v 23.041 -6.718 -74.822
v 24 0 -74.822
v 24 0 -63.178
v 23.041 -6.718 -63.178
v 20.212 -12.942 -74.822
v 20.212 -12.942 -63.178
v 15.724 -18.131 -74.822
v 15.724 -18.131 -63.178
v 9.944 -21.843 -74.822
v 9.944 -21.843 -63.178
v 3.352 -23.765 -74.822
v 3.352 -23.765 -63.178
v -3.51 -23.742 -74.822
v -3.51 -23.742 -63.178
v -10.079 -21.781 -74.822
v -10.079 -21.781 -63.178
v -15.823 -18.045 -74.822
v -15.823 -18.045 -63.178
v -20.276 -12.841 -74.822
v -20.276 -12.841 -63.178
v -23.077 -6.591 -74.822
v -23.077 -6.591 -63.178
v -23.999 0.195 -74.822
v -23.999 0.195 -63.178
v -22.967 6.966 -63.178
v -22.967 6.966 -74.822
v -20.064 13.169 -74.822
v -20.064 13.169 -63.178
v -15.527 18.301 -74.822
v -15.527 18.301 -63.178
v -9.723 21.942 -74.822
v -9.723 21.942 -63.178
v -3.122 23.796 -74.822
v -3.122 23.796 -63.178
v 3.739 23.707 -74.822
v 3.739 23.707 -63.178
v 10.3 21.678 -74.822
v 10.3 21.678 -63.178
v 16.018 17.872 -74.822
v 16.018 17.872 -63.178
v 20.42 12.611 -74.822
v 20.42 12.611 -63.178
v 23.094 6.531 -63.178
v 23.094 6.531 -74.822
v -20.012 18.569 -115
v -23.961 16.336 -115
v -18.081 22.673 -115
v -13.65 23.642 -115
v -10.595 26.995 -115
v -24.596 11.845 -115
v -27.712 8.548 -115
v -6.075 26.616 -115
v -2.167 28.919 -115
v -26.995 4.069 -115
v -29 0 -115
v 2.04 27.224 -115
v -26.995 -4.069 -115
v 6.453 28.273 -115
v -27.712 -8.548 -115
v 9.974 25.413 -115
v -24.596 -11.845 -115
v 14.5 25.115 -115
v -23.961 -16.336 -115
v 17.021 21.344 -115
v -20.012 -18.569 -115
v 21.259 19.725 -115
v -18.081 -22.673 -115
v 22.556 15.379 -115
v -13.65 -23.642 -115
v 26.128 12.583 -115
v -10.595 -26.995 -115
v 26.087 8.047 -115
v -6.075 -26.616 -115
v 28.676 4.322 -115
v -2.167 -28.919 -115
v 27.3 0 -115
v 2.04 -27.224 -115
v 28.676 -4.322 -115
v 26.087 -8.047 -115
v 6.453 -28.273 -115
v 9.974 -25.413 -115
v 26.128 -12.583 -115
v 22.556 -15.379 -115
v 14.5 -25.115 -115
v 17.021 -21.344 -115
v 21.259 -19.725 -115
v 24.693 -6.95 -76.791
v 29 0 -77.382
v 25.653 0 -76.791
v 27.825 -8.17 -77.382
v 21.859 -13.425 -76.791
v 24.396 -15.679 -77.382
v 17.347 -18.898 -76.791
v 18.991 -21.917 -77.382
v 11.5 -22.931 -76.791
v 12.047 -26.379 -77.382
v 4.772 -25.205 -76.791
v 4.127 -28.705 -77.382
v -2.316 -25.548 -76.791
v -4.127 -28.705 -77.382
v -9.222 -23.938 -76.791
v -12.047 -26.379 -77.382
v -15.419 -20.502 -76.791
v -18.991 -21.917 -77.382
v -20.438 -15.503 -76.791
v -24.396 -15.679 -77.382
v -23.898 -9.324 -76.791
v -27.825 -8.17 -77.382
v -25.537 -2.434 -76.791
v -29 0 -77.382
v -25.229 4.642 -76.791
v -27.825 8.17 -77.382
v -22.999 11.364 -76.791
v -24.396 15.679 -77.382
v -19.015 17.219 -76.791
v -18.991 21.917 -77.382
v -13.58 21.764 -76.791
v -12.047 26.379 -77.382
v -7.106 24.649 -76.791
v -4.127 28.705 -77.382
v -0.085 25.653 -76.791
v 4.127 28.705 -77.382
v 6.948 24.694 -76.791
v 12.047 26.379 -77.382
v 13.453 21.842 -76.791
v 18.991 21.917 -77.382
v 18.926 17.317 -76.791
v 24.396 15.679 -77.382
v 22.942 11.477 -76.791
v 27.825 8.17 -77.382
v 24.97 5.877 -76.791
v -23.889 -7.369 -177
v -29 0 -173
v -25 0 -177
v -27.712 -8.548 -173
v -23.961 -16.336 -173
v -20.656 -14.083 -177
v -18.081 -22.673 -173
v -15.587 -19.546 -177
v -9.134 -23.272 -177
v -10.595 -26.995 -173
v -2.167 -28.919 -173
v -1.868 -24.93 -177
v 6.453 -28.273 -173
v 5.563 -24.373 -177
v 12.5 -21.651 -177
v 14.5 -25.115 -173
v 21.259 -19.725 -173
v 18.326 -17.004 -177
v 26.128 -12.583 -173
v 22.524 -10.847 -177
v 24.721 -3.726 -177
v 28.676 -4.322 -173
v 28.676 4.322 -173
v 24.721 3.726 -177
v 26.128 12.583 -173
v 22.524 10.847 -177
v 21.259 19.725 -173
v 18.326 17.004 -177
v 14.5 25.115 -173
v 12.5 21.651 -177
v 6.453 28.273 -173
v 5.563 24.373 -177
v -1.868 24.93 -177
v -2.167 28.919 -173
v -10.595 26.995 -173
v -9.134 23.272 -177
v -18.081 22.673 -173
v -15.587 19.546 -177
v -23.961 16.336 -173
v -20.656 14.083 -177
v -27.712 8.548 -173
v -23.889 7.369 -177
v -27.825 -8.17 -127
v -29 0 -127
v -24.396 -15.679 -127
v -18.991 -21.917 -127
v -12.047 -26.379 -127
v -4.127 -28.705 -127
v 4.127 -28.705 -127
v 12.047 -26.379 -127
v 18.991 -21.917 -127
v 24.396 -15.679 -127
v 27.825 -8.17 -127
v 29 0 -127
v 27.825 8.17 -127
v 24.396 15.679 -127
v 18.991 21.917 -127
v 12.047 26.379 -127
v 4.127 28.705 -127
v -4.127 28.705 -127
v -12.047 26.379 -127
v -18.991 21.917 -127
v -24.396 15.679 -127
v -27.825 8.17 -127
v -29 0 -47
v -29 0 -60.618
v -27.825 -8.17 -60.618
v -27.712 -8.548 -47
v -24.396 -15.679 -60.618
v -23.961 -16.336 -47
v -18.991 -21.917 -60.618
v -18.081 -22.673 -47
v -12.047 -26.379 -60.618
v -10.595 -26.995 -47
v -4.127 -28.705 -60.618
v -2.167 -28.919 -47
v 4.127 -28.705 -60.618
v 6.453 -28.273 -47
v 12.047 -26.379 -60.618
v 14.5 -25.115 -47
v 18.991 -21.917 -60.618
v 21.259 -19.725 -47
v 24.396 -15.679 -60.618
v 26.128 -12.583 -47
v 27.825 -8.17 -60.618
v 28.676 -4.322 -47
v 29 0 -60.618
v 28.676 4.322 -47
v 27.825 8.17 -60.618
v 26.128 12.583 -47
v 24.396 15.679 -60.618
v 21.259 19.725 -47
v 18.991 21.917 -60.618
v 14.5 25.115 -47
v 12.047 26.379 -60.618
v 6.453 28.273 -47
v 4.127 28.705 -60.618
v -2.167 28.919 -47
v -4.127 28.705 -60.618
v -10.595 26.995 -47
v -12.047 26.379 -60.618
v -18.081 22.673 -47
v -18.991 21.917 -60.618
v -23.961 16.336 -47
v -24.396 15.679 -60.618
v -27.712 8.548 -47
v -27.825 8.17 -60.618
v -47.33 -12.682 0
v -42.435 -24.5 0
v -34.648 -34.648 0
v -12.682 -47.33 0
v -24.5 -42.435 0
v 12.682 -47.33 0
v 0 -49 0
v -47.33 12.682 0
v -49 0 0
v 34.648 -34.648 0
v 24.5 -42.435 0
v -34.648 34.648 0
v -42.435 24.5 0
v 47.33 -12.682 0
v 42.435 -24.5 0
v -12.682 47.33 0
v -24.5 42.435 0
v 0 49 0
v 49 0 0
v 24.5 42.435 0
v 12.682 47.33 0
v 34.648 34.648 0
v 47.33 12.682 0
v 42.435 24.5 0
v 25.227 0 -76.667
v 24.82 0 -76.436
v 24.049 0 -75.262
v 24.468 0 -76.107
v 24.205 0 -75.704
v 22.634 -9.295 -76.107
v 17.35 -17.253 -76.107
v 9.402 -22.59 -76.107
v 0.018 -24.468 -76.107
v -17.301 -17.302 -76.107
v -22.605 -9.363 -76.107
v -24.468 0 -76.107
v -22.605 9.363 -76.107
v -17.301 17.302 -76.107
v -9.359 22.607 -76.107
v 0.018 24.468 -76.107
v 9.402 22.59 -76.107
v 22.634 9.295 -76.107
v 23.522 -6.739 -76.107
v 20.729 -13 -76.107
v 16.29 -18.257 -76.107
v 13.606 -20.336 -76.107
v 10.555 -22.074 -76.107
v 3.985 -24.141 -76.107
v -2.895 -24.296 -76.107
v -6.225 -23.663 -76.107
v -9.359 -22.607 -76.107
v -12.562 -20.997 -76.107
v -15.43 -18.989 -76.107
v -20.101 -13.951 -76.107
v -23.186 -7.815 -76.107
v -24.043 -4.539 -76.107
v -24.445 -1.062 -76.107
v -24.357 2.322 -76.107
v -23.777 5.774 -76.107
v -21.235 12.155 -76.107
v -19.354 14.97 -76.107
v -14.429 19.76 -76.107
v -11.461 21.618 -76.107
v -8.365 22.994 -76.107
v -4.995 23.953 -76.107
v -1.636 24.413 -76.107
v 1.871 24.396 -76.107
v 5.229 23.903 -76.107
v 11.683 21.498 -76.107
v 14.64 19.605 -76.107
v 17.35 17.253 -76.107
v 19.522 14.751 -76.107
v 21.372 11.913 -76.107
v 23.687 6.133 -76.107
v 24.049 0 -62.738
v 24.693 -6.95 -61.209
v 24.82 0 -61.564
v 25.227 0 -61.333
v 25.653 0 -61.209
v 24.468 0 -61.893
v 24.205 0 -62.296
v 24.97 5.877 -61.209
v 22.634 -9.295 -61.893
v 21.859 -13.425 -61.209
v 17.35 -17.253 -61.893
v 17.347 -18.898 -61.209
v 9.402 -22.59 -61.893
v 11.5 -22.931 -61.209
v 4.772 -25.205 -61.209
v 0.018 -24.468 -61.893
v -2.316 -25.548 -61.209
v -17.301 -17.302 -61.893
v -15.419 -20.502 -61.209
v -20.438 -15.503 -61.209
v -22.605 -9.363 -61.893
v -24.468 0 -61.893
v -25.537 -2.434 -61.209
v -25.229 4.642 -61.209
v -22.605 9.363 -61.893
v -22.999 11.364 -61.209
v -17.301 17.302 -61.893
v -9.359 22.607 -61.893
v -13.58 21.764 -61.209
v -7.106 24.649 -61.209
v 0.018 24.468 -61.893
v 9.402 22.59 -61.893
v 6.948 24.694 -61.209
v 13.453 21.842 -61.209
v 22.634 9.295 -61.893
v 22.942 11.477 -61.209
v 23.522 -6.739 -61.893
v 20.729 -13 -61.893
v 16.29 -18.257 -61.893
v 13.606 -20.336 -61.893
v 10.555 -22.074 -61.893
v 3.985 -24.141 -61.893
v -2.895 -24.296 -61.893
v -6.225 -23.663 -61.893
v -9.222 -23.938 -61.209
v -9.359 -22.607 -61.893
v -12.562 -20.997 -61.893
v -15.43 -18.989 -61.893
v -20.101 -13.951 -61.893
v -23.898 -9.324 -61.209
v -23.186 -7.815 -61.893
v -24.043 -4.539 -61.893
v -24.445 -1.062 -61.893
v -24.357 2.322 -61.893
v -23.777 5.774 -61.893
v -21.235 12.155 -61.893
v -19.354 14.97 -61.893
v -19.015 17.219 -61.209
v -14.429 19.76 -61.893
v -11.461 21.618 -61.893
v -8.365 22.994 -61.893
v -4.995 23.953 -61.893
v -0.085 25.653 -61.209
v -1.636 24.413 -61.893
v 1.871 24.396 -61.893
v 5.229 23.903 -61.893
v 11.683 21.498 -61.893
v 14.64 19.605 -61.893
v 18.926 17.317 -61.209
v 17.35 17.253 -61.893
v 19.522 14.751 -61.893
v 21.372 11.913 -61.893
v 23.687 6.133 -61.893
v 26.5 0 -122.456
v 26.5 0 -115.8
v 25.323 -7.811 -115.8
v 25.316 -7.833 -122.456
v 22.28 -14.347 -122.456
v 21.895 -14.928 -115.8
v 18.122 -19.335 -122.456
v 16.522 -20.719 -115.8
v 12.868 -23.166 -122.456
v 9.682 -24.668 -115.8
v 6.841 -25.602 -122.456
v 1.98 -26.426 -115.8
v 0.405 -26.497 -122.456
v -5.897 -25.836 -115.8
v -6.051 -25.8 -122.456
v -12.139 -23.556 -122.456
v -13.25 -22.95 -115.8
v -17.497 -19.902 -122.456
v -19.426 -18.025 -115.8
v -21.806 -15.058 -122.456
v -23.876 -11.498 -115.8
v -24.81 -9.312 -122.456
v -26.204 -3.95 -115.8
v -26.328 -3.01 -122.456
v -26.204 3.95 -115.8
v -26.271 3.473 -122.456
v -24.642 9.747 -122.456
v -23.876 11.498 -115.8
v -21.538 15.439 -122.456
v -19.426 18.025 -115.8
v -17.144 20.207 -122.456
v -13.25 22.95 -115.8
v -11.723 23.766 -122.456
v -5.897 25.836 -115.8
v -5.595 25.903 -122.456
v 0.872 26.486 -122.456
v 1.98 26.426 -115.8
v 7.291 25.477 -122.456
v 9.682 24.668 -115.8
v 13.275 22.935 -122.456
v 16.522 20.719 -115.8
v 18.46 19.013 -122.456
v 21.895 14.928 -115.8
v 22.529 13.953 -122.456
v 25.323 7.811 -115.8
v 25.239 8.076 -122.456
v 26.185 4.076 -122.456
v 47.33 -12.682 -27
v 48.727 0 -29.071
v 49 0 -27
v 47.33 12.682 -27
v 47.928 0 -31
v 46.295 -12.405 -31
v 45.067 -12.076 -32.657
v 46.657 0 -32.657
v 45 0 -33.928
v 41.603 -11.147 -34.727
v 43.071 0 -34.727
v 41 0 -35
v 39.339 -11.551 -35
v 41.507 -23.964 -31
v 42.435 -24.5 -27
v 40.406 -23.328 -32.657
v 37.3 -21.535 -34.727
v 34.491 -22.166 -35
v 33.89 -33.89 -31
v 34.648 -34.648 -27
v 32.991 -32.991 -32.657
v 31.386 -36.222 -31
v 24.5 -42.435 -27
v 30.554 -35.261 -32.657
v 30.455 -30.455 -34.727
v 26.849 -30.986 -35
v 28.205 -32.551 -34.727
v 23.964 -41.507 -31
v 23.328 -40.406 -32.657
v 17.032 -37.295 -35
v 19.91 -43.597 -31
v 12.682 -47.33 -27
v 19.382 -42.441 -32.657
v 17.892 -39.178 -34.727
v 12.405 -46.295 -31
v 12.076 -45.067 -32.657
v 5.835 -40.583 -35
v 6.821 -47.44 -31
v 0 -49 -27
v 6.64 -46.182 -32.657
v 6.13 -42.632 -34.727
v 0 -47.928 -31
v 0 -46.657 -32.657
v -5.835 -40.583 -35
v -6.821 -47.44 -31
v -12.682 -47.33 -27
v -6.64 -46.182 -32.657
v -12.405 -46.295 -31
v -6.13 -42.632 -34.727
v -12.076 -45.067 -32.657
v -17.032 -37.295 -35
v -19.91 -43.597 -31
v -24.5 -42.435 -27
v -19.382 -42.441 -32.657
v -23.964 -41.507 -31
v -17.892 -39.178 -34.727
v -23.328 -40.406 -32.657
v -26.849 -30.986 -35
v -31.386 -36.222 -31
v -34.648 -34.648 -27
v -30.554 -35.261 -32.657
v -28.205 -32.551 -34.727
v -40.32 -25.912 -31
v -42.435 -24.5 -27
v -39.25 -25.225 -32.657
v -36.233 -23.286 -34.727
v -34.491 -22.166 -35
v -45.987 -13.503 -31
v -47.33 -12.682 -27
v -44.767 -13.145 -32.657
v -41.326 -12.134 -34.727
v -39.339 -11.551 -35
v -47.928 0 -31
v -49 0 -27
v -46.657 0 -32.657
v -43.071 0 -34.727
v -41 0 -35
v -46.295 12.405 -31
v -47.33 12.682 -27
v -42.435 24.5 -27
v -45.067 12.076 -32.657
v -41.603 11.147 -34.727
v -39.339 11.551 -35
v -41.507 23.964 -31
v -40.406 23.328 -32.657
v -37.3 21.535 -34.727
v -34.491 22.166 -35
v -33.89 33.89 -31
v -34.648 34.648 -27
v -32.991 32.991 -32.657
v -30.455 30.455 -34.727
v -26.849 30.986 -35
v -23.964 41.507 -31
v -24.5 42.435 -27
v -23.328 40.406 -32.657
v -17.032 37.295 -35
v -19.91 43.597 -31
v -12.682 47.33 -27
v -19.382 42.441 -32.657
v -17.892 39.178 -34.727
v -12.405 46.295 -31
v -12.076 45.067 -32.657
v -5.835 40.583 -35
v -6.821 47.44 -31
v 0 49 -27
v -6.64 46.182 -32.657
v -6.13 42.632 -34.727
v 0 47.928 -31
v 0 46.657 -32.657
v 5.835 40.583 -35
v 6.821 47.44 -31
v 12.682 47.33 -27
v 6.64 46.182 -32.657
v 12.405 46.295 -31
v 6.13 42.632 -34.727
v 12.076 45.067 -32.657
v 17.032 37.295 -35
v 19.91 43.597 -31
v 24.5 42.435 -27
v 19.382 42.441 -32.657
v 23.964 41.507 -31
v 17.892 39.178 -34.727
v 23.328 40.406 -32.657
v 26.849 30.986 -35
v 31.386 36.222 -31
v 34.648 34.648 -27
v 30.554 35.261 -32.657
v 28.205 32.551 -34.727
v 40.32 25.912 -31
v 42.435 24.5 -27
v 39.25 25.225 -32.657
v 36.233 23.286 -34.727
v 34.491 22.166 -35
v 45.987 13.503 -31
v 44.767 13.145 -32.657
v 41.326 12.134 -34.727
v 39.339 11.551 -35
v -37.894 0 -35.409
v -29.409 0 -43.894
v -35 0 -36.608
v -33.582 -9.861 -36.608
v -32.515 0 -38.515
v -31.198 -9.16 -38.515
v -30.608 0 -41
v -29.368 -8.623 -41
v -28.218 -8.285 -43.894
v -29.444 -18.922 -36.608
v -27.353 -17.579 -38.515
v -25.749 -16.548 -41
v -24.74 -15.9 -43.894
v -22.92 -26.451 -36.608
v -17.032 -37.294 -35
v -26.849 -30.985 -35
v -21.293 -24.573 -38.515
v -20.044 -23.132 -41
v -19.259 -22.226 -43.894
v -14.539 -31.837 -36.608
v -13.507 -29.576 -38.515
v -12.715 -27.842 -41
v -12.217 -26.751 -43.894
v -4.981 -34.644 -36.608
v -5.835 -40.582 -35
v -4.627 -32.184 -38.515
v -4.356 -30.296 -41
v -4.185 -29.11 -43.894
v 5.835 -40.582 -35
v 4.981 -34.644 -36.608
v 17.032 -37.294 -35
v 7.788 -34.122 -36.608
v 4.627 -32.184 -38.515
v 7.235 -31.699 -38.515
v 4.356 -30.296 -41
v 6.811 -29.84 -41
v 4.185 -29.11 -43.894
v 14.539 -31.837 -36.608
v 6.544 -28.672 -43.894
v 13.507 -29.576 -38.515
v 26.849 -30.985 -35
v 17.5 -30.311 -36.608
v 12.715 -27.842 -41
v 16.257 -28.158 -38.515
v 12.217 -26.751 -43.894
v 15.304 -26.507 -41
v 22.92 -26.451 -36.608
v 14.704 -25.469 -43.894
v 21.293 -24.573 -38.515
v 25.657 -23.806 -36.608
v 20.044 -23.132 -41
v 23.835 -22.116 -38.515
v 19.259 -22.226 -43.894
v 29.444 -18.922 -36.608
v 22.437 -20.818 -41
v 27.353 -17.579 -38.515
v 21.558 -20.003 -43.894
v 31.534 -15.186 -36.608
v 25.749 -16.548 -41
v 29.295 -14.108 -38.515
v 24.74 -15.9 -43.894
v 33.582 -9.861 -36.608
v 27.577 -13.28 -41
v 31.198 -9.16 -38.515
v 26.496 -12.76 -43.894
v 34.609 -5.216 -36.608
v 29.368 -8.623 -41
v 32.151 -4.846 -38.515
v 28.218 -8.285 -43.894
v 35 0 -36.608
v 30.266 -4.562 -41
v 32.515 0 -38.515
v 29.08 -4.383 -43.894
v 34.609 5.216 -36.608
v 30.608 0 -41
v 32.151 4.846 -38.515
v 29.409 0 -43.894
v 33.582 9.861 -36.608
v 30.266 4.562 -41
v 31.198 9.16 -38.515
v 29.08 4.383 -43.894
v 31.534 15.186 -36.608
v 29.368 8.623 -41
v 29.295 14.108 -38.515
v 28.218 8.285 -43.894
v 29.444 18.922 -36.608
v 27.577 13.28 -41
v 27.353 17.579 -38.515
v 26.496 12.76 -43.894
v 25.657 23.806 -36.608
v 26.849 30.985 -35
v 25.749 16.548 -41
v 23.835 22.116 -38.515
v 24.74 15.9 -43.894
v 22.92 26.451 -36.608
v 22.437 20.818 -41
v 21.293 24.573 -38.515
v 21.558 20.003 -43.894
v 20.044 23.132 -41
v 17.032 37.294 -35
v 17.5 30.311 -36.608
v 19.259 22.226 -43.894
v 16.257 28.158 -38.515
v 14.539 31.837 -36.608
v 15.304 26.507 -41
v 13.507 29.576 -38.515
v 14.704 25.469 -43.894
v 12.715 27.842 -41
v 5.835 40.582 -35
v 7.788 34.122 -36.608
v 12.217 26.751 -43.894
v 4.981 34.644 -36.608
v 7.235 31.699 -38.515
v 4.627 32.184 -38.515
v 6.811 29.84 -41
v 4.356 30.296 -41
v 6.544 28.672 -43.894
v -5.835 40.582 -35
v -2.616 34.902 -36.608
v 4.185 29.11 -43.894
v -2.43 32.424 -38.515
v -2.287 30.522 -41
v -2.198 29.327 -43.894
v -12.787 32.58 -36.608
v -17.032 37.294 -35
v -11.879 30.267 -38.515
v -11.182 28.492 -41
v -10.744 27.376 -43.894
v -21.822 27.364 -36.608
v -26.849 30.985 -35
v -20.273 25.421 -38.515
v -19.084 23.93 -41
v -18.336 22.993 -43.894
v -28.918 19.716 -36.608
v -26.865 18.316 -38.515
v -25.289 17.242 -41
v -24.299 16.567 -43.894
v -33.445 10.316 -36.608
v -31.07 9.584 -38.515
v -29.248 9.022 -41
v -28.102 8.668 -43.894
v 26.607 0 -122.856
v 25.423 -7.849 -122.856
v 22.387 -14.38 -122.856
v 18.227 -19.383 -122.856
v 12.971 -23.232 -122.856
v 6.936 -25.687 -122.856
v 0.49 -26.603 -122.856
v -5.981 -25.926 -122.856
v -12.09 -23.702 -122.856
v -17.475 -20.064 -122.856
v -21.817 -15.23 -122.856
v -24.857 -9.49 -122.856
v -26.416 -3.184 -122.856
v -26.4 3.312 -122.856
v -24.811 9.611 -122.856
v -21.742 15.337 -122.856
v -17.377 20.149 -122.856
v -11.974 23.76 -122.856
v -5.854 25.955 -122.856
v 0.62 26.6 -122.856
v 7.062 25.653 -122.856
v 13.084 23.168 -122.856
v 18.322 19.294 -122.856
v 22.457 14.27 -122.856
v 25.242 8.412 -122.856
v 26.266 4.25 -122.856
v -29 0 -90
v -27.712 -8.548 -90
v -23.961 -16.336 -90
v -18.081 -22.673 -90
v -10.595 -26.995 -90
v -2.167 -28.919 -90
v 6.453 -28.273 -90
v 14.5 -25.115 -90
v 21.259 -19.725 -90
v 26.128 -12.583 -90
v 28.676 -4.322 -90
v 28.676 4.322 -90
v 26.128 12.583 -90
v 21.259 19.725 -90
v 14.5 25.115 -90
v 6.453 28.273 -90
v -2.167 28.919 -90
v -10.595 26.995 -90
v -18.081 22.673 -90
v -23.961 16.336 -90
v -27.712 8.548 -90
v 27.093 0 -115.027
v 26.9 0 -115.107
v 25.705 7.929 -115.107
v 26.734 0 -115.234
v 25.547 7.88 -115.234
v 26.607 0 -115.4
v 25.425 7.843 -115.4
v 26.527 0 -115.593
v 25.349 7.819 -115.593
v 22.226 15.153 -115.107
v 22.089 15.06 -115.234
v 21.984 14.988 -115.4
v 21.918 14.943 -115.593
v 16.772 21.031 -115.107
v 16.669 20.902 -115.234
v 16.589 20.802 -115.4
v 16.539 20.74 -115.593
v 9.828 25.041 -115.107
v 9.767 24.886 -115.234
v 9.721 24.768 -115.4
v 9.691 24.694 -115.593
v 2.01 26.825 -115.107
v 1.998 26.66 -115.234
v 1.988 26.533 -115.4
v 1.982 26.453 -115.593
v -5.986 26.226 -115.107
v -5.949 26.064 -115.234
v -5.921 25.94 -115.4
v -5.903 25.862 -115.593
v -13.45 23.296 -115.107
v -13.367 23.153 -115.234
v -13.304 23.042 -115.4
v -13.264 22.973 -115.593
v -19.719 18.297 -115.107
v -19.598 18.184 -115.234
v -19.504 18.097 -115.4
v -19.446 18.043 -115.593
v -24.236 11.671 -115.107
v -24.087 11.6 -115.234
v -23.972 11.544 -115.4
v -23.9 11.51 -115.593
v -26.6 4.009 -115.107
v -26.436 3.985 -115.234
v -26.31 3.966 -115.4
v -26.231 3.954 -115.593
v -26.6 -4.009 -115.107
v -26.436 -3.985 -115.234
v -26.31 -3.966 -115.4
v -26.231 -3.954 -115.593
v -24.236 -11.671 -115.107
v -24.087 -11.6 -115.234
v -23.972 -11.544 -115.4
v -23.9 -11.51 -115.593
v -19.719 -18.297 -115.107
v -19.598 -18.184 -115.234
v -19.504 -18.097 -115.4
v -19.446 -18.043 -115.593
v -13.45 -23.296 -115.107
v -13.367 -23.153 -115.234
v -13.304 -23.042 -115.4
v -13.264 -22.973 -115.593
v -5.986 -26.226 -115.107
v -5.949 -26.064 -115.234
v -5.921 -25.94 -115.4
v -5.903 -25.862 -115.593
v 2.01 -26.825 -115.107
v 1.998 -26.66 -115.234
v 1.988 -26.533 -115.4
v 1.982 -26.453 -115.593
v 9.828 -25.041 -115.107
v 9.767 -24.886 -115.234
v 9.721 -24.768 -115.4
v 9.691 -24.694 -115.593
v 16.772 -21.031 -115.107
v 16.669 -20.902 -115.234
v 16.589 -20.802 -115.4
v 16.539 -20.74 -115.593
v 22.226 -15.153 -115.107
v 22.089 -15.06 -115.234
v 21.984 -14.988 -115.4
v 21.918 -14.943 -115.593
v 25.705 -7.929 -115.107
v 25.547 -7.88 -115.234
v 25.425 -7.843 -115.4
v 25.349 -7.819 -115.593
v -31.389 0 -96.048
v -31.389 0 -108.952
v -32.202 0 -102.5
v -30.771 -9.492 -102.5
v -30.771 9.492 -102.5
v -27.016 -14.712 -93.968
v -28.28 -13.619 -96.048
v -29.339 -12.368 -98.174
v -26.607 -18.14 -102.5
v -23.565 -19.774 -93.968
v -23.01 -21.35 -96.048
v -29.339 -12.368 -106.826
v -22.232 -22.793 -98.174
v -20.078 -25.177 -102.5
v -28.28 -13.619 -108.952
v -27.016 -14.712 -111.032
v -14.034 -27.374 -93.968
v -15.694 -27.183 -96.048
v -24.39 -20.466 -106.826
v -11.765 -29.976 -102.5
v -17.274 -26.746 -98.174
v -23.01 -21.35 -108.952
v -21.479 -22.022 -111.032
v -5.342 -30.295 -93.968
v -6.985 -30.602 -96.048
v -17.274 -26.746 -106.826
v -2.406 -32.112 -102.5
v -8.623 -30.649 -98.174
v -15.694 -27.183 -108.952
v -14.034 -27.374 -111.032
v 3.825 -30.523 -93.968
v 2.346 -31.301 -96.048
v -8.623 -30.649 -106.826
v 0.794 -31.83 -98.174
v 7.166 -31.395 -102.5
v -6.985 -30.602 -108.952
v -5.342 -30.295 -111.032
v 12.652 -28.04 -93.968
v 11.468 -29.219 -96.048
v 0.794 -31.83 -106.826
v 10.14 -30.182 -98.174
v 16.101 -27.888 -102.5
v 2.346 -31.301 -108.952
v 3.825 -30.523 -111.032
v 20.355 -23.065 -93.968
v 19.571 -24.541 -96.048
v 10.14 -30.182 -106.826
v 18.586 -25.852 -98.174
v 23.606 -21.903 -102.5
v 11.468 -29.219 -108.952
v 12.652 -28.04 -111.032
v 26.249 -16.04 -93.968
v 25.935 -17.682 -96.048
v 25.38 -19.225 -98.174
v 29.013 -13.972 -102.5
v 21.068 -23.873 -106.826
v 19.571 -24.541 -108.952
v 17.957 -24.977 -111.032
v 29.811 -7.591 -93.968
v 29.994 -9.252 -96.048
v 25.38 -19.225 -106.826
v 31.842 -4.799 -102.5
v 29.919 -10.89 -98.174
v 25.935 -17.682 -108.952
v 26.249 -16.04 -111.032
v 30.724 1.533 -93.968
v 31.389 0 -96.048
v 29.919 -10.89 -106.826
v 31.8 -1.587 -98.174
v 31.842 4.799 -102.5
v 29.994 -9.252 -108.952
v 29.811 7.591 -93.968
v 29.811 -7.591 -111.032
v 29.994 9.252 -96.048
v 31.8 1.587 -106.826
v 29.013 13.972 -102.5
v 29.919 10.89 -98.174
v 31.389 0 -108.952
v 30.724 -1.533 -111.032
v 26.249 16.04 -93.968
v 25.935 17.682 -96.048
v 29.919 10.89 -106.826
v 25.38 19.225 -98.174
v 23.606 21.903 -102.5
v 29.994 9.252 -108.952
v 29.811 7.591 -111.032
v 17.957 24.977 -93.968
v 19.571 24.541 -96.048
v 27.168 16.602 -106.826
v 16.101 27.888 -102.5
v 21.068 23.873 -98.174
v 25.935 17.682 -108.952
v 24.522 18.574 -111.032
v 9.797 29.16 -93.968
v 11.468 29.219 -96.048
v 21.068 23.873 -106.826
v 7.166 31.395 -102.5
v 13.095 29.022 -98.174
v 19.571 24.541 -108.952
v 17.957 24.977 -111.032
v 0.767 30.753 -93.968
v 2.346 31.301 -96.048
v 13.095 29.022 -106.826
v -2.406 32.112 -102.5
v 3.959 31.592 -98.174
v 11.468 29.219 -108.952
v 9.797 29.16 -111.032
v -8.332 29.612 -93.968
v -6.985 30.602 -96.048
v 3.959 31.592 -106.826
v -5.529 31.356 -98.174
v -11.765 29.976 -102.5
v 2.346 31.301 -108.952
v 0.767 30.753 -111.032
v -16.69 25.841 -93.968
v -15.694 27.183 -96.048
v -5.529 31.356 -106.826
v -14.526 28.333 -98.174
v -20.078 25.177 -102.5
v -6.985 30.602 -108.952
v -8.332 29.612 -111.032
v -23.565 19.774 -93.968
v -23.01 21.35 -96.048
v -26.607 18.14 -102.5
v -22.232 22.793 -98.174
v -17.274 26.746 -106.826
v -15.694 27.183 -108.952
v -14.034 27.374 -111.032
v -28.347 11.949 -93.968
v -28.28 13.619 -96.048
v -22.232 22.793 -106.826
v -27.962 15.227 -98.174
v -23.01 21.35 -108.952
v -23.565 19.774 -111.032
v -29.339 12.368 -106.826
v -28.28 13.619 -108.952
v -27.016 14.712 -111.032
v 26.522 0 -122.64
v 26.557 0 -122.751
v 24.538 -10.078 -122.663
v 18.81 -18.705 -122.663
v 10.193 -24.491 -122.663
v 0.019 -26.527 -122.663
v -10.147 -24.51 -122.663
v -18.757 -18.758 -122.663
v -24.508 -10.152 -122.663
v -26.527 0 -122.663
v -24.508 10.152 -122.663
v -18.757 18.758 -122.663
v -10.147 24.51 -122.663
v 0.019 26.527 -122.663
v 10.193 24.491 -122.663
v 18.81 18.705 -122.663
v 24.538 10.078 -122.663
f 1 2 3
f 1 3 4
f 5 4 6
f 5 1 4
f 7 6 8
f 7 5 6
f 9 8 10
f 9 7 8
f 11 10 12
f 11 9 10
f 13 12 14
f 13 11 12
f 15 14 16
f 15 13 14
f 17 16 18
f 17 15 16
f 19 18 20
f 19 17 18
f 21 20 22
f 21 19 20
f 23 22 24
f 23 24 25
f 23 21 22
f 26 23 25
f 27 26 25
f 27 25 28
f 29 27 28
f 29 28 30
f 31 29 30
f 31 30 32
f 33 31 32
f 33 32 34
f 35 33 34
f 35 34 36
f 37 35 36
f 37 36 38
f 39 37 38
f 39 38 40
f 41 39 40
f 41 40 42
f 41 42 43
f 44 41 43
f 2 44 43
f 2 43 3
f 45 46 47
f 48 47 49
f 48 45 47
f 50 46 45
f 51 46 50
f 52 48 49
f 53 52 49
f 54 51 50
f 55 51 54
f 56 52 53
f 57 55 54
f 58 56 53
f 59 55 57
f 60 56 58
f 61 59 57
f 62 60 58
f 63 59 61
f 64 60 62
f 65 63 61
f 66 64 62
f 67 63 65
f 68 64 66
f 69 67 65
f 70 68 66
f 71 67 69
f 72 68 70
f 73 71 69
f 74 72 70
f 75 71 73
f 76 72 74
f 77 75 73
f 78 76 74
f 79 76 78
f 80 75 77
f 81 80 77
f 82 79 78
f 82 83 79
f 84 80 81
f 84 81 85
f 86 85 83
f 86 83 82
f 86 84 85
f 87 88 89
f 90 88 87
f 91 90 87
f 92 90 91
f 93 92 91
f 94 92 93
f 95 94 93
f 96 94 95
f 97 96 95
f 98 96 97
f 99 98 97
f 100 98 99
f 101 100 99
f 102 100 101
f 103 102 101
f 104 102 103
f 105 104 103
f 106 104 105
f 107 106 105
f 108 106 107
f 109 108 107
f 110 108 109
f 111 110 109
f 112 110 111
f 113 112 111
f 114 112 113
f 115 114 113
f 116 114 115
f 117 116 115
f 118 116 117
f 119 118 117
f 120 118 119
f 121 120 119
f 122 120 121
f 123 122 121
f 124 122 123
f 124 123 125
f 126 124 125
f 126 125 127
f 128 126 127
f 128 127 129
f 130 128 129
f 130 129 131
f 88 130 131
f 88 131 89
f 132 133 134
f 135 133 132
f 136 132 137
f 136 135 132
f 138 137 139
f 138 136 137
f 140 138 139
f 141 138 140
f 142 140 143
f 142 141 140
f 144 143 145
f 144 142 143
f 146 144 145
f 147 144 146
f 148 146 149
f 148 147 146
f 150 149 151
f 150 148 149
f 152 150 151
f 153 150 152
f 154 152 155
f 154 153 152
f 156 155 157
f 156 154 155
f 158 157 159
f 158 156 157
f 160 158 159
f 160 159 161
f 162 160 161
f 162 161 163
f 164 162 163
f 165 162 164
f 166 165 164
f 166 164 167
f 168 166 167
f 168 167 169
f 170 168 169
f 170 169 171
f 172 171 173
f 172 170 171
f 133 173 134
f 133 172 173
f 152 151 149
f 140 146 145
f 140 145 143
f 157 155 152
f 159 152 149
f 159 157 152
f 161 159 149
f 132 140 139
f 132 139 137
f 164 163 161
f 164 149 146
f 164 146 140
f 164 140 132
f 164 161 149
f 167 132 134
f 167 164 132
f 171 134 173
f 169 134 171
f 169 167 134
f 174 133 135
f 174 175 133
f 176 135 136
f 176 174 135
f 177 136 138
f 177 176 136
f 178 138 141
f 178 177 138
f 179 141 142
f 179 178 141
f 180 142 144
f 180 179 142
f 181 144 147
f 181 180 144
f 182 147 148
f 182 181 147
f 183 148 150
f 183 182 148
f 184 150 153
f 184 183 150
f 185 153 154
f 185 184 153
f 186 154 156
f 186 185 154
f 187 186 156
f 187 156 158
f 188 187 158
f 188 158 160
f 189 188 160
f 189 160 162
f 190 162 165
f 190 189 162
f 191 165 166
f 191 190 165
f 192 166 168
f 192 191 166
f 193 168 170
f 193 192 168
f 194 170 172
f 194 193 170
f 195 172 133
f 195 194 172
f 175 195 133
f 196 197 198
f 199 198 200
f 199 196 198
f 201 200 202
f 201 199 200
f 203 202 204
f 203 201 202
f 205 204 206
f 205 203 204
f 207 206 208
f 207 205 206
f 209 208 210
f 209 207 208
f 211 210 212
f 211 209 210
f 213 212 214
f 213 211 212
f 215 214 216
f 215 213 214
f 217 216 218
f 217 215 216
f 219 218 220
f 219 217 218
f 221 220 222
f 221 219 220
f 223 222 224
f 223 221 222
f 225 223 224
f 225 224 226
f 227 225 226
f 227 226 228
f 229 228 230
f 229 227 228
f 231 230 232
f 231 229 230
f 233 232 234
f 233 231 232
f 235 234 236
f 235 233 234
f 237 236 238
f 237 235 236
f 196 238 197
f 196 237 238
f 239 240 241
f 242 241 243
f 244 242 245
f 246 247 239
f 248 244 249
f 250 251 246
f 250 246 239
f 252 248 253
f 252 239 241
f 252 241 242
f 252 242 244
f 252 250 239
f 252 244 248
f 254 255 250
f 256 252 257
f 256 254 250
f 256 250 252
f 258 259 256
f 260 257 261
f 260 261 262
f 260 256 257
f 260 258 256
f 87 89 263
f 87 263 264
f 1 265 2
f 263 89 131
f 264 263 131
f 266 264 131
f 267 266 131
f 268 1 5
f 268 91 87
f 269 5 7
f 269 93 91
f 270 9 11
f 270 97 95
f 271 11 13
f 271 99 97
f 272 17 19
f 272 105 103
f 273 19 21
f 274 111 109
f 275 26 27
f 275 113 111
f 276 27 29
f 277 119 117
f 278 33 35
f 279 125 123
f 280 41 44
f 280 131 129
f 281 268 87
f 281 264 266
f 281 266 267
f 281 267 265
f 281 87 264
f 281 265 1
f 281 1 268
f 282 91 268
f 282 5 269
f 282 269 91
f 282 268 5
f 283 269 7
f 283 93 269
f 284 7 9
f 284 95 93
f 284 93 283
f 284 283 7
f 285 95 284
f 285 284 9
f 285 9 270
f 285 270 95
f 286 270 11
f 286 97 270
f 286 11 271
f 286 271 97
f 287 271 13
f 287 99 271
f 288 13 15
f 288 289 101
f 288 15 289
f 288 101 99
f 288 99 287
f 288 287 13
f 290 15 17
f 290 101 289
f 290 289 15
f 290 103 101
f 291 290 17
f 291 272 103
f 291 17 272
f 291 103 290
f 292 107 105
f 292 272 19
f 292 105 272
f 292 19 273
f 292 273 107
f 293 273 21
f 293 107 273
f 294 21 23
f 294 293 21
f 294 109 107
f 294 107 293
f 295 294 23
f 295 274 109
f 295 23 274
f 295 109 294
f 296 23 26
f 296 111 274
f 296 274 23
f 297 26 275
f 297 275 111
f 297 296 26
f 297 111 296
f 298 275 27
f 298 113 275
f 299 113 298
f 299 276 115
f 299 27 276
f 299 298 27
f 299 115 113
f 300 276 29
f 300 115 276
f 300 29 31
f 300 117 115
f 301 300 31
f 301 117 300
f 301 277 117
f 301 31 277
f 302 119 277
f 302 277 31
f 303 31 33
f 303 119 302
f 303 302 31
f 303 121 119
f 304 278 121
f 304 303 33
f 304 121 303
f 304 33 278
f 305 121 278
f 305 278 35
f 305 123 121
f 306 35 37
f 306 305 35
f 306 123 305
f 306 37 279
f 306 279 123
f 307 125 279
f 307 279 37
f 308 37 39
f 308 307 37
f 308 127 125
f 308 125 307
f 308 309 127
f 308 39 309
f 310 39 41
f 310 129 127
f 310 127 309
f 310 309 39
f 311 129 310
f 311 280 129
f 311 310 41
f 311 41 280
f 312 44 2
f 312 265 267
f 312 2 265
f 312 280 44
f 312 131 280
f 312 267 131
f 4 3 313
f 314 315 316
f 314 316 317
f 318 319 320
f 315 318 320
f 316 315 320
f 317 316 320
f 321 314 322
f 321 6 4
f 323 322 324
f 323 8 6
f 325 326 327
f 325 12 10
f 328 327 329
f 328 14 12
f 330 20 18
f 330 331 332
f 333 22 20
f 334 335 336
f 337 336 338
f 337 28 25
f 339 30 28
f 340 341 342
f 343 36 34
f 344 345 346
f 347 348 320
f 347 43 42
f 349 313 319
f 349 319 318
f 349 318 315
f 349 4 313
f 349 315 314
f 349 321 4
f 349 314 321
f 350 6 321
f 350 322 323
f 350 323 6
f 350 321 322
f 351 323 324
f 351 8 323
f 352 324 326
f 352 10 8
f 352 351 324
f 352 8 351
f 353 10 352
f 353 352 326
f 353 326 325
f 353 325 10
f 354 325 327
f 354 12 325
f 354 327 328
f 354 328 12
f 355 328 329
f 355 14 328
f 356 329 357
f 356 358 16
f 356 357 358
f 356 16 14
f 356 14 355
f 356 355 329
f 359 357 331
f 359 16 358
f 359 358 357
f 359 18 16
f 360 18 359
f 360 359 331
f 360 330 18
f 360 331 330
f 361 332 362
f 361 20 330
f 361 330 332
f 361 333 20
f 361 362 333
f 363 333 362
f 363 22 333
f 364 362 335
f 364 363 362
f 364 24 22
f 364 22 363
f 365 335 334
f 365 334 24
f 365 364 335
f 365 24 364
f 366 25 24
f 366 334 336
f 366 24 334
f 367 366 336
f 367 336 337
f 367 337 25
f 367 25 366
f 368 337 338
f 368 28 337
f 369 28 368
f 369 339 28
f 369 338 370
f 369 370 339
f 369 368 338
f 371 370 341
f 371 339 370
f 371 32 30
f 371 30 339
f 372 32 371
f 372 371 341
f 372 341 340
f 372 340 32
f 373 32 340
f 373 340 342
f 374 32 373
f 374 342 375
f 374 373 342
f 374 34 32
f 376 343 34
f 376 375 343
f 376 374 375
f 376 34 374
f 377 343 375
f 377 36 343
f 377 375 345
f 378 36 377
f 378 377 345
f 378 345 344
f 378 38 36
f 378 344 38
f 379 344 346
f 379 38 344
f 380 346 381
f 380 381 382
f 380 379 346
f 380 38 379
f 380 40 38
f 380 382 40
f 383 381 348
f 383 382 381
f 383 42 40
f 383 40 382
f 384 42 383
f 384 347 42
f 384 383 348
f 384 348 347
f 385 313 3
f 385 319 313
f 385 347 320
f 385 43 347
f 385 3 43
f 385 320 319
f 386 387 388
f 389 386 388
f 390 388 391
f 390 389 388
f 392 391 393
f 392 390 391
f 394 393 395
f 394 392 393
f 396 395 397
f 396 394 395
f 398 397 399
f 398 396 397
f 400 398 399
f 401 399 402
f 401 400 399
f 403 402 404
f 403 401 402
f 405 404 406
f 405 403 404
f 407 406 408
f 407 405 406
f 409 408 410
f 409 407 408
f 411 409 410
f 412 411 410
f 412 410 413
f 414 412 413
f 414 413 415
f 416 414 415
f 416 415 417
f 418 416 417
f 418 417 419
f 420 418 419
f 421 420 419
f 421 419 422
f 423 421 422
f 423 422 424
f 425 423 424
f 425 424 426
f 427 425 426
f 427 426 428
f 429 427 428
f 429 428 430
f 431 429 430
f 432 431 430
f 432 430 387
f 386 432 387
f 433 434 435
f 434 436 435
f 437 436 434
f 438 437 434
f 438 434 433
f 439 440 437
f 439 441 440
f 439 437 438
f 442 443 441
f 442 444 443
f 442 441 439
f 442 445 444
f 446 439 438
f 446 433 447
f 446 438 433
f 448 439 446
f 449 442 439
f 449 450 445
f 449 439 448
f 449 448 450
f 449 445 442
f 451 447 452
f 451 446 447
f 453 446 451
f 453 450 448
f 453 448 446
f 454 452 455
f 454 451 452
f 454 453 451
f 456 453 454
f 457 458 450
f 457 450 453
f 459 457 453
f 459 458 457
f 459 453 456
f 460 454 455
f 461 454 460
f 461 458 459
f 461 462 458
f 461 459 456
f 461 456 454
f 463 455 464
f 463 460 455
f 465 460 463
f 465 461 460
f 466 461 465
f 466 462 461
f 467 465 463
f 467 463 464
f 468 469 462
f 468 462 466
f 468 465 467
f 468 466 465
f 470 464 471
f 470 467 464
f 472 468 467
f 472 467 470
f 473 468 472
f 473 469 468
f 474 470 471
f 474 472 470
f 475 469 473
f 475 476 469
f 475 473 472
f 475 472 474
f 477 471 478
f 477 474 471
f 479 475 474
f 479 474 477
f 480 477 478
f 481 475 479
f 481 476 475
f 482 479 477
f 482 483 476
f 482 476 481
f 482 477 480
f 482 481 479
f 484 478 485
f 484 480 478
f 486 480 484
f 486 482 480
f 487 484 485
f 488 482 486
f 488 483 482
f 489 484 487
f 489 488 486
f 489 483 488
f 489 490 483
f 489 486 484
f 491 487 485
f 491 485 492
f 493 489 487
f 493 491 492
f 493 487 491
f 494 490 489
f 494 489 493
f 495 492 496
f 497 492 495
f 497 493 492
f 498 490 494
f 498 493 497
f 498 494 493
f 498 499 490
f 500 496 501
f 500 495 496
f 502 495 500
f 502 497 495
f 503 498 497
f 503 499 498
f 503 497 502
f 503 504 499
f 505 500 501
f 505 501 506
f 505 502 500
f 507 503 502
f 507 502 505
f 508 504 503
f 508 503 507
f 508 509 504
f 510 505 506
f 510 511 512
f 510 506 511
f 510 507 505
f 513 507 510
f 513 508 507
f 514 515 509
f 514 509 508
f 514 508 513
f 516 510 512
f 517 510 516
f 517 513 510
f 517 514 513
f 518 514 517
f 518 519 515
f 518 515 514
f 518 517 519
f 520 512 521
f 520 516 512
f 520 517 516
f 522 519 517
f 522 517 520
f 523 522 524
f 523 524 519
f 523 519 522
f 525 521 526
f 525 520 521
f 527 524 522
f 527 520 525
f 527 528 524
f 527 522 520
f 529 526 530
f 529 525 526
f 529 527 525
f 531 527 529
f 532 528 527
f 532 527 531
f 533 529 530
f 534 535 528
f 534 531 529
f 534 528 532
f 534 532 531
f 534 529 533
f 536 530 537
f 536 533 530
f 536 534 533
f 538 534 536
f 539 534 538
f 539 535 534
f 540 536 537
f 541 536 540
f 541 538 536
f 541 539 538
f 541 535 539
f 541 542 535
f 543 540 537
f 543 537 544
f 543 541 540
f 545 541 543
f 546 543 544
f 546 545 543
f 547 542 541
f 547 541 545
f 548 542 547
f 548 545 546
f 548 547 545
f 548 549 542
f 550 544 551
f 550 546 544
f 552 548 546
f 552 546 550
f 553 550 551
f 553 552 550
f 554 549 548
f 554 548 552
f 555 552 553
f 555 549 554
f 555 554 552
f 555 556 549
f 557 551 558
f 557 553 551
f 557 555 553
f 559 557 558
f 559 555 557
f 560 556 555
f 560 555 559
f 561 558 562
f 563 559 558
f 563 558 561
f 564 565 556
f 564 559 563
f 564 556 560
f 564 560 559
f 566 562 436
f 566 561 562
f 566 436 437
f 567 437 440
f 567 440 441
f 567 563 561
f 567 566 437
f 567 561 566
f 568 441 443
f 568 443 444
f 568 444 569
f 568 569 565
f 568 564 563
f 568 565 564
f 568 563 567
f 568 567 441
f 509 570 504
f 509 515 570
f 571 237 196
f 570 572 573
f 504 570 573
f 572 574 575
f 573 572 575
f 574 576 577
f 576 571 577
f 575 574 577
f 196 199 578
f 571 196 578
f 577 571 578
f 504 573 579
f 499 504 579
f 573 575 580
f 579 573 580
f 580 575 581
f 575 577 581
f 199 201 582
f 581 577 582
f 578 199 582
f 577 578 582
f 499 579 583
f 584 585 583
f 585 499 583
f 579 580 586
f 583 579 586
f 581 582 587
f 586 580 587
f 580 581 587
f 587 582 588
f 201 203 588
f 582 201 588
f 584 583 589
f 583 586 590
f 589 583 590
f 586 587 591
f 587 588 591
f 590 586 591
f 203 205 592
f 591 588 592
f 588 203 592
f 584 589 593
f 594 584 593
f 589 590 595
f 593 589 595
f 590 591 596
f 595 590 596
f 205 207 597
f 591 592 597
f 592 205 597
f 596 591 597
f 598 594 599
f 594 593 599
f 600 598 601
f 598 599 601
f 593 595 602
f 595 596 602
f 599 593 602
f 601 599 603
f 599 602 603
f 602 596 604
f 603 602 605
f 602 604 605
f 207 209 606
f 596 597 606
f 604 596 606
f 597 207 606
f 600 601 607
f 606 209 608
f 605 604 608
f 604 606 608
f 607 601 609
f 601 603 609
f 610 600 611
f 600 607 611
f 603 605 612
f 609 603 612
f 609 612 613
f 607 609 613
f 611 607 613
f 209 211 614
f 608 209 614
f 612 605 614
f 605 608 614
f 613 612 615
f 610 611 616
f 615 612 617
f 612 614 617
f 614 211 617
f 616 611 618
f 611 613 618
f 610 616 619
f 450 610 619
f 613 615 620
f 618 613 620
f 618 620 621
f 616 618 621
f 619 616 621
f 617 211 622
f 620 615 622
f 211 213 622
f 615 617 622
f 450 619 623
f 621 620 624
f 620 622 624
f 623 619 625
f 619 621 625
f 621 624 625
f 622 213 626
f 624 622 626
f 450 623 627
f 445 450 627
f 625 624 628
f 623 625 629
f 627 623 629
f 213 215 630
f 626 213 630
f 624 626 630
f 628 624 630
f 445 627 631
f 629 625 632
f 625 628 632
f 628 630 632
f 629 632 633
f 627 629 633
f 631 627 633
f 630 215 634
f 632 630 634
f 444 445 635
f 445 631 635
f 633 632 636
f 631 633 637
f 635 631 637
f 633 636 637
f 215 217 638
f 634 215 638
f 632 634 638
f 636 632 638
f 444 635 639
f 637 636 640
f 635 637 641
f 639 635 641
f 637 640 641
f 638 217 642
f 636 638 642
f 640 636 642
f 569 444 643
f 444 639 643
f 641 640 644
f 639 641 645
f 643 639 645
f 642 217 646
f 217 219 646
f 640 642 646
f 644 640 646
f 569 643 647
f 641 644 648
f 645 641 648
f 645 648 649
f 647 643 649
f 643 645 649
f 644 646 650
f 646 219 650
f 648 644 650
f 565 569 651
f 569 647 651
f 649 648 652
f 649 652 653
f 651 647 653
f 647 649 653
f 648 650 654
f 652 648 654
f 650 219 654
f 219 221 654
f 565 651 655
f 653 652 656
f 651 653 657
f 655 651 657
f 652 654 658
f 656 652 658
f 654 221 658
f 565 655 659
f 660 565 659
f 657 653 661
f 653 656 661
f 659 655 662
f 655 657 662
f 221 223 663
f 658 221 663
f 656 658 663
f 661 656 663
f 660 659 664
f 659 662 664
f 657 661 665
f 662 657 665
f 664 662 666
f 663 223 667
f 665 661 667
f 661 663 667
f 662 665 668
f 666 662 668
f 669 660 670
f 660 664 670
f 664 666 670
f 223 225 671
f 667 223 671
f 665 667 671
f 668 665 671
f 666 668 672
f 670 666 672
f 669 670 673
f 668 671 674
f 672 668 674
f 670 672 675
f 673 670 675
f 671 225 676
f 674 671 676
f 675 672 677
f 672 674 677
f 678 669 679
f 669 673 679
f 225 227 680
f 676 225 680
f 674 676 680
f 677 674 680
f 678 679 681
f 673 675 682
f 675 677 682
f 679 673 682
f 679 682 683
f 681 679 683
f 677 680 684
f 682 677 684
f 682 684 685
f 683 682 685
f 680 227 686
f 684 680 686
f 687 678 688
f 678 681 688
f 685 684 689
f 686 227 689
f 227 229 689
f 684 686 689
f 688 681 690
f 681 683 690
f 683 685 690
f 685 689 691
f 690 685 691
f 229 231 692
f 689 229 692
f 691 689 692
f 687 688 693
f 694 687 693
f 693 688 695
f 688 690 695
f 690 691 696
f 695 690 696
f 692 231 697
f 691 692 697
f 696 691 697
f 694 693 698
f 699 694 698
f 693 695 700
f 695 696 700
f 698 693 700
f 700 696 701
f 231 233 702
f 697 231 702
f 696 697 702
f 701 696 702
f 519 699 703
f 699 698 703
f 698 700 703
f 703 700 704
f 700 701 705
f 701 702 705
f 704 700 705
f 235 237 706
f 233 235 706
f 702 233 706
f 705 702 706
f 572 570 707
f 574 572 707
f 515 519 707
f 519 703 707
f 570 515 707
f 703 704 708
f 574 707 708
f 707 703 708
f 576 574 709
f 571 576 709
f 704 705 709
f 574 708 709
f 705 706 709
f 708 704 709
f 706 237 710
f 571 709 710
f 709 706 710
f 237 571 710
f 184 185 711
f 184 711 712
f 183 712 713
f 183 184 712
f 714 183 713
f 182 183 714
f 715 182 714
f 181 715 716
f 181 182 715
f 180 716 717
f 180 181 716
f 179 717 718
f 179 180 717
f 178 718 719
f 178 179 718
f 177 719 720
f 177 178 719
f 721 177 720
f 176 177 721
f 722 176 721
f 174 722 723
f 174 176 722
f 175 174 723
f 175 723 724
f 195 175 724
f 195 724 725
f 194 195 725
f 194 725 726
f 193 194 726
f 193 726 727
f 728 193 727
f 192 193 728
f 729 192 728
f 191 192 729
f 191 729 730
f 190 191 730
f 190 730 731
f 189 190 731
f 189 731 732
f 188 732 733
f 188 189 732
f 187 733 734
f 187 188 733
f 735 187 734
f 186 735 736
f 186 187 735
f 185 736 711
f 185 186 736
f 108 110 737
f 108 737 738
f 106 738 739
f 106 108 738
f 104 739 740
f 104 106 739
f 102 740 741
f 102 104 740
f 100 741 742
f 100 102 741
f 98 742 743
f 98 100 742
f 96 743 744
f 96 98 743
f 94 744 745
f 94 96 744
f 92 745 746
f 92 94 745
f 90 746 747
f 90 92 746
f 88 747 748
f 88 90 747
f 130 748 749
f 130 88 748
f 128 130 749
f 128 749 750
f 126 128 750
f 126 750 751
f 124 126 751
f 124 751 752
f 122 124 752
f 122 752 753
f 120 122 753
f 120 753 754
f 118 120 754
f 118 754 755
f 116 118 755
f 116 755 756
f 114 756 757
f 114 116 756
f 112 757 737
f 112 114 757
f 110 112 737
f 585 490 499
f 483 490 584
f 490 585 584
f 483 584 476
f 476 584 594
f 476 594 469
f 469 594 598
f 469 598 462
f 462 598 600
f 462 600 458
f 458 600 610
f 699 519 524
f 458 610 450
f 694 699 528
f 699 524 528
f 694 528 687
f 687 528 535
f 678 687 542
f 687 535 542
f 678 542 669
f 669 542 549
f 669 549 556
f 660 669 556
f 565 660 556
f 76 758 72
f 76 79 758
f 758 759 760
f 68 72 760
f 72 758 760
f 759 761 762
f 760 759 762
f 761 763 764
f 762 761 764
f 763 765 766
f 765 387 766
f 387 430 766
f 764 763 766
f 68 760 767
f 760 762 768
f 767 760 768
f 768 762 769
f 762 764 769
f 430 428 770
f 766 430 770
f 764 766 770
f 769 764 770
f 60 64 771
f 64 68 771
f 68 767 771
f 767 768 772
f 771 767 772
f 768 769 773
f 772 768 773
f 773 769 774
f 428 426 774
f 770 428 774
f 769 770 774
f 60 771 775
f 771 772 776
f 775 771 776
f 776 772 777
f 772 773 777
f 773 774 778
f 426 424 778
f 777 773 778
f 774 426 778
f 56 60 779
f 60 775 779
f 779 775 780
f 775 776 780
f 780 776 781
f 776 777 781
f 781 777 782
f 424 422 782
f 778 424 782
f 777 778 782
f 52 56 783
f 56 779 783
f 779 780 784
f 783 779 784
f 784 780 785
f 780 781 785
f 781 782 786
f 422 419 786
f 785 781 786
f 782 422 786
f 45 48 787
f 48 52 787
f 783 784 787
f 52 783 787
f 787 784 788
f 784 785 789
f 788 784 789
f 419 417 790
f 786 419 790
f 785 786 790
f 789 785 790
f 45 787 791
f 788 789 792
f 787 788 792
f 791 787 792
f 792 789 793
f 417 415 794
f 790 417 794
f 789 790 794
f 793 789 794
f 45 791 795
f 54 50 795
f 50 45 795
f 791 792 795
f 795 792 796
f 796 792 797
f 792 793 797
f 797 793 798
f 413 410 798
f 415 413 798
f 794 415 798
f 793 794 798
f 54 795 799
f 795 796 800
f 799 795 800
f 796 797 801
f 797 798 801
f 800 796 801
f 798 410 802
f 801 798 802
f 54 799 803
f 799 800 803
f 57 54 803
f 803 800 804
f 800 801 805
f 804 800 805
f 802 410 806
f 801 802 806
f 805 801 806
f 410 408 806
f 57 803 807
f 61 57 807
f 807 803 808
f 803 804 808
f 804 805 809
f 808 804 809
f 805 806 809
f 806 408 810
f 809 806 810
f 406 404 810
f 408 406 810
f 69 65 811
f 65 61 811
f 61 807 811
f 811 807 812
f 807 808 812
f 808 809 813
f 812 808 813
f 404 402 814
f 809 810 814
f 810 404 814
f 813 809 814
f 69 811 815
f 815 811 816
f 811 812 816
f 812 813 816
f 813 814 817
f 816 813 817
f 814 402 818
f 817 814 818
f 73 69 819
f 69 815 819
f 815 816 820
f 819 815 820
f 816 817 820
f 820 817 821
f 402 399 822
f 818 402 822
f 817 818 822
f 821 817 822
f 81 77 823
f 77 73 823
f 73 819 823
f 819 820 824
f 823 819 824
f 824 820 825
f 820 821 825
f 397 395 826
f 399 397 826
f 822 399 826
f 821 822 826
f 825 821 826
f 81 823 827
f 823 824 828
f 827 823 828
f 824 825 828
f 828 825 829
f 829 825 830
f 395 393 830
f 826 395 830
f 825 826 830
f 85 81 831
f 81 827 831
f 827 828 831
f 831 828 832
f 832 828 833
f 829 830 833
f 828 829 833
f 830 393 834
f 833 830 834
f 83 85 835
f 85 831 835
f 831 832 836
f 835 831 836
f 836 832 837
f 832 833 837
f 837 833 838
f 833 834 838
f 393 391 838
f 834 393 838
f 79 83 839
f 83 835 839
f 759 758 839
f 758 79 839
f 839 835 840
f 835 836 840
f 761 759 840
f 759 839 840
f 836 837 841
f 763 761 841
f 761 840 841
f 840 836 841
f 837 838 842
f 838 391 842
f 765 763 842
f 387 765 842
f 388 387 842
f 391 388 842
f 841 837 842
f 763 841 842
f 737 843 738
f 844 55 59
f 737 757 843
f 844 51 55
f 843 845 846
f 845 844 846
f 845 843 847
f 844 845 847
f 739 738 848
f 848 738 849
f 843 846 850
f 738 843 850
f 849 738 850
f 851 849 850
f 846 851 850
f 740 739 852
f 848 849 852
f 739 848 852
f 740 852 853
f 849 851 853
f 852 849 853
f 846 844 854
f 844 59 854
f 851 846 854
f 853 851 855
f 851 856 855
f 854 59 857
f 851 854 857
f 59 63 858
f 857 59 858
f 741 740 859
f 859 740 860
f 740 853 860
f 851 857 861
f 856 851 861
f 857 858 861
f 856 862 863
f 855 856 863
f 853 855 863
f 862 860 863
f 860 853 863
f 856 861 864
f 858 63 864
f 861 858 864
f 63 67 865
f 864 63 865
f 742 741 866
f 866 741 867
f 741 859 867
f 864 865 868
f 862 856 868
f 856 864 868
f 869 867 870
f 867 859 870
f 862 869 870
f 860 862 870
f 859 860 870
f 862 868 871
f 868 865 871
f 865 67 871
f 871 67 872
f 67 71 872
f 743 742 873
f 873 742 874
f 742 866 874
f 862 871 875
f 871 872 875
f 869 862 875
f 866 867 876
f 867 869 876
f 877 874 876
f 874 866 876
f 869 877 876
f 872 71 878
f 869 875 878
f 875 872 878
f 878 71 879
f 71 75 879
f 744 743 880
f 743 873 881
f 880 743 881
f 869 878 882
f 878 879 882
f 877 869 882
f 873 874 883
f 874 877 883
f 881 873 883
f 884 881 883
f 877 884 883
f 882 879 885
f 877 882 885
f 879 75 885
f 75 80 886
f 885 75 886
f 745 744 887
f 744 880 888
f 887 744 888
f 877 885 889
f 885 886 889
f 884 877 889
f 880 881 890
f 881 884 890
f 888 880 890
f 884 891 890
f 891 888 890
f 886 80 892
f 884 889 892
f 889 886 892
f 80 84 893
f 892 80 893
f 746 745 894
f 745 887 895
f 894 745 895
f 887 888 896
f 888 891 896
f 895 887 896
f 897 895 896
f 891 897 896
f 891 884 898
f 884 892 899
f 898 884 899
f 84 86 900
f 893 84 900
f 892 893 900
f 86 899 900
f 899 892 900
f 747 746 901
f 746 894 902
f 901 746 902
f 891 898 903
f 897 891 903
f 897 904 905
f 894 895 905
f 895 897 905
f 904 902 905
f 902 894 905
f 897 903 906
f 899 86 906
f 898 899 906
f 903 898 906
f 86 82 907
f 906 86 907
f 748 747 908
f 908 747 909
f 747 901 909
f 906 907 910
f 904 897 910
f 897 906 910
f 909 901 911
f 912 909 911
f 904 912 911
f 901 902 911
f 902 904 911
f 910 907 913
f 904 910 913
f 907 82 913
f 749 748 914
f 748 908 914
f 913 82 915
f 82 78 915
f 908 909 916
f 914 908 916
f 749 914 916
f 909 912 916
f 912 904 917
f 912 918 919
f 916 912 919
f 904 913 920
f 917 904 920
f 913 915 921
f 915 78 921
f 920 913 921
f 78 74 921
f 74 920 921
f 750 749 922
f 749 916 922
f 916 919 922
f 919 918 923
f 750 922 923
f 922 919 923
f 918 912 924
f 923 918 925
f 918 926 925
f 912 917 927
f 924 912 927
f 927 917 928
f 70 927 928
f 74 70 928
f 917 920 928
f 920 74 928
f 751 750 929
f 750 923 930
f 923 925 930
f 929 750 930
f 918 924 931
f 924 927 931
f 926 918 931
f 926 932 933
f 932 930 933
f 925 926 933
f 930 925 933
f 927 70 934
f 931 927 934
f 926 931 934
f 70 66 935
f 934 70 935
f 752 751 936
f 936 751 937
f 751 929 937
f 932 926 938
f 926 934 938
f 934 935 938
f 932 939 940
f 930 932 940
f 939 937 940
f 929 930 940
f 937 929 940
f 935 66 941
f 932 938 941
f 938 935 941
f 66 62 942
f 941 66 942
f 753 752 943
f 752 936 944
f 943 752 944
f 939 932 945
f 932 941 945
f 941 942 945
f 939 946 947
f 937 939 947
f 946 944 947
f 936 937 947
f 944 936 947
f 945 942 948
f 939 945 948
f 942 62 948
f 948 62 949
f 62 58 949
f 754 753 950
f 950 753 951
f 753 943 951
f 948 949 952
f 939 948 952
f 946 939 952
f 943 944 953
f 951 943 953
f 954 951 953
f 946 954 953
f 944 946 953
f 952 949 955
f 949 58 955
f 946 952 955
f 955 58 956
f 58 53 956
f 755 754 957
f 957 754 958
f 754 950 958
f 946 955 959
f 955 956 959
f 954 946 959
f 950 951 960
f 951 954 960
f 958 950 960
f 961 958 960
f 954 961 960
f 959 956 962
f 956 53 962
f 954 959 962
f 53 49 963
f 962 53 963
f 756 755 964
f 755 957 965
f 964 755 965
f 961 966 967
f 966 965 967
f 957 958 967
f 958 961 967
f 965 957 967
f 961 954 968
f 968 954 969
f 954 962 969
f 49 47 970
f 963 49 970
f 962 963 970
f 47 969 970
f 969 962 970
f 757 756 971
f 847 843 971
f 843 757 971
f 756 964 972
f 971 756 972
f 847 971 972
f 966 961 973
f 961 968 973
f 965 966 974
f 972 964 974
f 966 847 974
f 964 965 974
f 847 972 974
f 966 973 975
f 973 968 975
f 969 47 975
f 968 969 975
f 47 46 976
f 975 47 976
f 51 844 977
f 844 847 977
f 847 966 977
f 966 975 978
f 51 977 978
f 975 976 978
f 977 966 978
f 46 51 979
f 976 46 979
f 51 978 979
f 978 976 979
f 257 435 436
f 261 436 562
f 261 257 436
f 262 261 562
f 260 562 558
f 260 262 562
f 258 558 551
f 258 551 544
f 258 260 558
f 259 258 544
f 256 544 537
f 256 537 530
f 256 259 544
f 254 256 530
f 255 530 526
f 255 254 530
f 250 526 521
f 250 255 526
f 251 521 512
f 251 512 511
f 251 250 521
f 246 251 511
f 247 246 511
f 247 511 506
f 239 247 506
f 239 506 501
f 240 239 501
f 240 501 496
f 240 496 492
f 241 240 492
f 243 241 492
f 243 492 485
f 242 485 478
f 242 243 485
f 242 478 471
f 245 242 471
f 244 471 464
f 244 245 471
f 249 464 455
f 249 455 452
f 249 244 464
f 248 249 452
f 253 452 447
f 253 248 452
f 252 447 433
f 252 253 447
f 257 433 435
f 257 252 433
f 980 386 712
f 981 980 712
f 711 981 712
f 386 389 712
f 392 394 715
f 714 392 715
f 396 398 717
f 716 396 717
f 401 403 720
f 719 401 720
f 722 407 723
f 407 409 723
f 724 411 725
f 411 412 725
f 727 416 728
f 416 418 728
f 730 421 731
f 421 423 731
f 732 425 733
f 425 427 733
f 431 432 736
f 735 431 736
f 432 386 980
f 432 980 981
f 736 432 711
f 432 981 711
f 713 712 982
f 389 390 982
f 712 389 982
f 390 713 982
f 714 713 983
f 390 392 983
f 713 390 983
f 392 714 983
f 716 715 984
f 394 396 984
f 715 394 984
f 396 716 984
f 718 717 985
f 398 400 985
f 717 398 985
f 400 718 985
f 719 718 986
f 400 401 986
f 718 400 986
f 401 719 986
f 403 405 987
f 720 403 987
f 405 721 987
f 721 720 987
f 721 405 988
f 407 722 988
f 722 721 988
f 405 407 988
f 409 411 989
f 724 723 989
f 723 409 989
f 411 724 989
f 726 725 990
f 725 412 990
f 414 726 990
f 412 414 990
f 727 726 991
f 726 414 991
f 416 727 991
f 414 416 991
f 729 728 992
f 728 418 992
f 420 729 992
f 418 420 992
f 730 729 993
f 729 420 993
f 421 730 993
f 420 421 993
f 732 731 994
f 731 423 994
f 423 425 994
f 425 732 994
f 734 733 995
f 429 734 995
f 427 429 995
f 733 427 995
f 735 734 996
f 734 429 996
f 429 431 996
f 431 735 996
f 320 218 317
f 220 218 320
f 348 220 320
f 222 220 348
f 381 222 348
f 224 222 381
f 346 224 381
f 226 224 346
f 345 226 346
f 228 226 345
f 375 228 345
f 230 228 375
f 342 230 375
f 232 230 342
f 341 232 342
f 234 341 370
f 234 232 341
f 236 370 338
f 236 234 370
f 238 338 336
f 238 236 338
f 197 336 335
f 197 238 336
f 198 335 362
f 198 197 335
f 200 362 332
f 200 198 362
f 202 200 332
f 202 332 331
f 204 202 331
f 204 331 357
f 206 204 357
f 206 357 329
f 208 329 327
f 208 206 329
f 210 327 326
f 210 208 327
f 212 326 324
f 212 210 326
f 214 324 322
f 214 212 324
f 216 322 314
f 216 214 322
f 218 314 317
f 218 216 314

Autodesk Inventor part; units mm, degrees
ref_plane "XZ Plane" through (0, 0, 0) normal (0, 1, 0) x (-1, 0, 0)
ref_plane "XY Plane" through (0, 0, 0) normal (0, 0, 1) x (1, 0, 0)
sketch "Szkic1" plane through (0, 0, 0) normal (0, 0, 1) x (1, 0, 0)
  circle A0 centre (0, 0) radius 49
  dimension "d0" = 98
extrude "Wyciągnięcie proste1" add sketch "Szkic1" against normal blind 35
sketch "Szkic2" plane through (0, 0, -35) normal (0, 0, -1) x (-1, 0, 0)
  circle A0 centre (0, 0) radius 29
  circle A1 centre (0, 0) radius 49 projected
  dimension "d3" = 58
extrude "Wyciągnięcie proste2" add sketch "Szkic2" along normal blind 55 contours A0
fillet "Zaokrąglenie1" radius 8 1 edges at (-49, 0, -35)
fillet "Zaokrąglenie2" radius 12 1 edges at (29, 0, -35)
ref_plane "Płaszczyzna konstrukcyjna1" through (0, 0, -35) normal (0, -1, 0) x (0, 0, -1)
sketch "Szkic3" plane through (0, 0, -35) normal (0, -1, 0) x (0, 0, -1)
  line L0 (12, -29) -> (55, -29) projected
  line L1 (55, -29) -> (55, 29) projected
  line L2 (55, -29) -> (80, -29) construction
  line L3 (67.5, -32.202) -> (67.5, 45.2604) construction
  arc A0 (55, -29) -> (80, -29) centre (67.5, -6.202) ccw
  line L4 (80, -29) -> (80, 0)
  line L5 (80, 0) -> (55, 0)
  point P0 (-35, 0)
  dimension "d9" = 25
  dimension "d10" = 12.5
  dimension "d11" = 26
revolve "Obrót1" add sketch "Szkic3" angle 360 about axis through (0, 0, -115) along (0, 0, 1)
sketch "Szkic4" plane through (0, 0, -115) normal (0, 0, -1) x (-1, 0, 0)
  circle A0 centre (0, 0) radius 29 projected
extrude "Wyciągnięcie proste3" add sketch "Szkic4" along normal blind 62
sketch "Szkic5" plane through (0, 0, -35) normal (0, -1, 0) x (0, 0, -1)
  line L0 (12, 29) -> (55, 29) projected
  line L1 (34, 66.9437) -> (34, -72.7347) construction
  line L2 (142, -29) -> (142, 29) projected
  line L3 (25.6184, 29) -> (26.5, 24)
  line L4 (26.5, 24) -> (41.5, 24)
  line L5 (41.5, 24) -> (42.3816, 29)
  line L6 (-70.4, 0) -> (177.4, 0) projected
  point P0 (-35, 0)
  dimension "d15" = 108
  dimension "d16" = 5
  dimension "d17" = 7.5
  dimension "d18" = 15
  dimension "d19" = 10
revolve "Obrót2" cut sketch "Szkic5" angle 360 about axis through (0, 0, -35) along (0, 0, -1)
fillet "Zaokrąglenie3" radius 2 1 edges at (-24, 0, -76.5)
fillet "Zaokrąglenie4" radius 2 1 edges at (-24, 0, -61.5)
sketch "Szkic6" plane through (0, 0, -35) normal (0, -1, 0) x (0, 0, -1)
  line L0 (80, 29) -> (142, 29) projected
  line L1 (80, 29) -> (80, -29) projected
  line L2 (80, 29) -> (142, 29) projected
  line L3 (80, 26.5) -> (87.6699, 26.5)
  line L4 (87.6699, 26.5) -> (92, 29)
  line L5 (-70.4, 0) -> (177.4, 0) projected
  point P0 (-35, 0)
  point P1 (83.8349, 26.5)
  dimension "d23" = 2.5
  dimension "d24" = 30
  dimension "d25" = 12
revolve "Obrót3" cut sketch "Szkic6" angle 360 about axis through (0, 0, -35) along (0, 0, -1)
fillet "Zaokrąglenie5" radius 0.8 1 edges at (-26.5, 0, -115)
fillet "Zaokrąglenie6" radius 0.8 1 edges at (-26.5, 0, -122.6699)
chamfer "Faza1" distance 4 angle 45 1 edges at (29, 0, -177)
thread "Gwint1" size "M58x3" class "6g" standard "ANSI Metric M Profile" full length
properties part number "walec W4"
